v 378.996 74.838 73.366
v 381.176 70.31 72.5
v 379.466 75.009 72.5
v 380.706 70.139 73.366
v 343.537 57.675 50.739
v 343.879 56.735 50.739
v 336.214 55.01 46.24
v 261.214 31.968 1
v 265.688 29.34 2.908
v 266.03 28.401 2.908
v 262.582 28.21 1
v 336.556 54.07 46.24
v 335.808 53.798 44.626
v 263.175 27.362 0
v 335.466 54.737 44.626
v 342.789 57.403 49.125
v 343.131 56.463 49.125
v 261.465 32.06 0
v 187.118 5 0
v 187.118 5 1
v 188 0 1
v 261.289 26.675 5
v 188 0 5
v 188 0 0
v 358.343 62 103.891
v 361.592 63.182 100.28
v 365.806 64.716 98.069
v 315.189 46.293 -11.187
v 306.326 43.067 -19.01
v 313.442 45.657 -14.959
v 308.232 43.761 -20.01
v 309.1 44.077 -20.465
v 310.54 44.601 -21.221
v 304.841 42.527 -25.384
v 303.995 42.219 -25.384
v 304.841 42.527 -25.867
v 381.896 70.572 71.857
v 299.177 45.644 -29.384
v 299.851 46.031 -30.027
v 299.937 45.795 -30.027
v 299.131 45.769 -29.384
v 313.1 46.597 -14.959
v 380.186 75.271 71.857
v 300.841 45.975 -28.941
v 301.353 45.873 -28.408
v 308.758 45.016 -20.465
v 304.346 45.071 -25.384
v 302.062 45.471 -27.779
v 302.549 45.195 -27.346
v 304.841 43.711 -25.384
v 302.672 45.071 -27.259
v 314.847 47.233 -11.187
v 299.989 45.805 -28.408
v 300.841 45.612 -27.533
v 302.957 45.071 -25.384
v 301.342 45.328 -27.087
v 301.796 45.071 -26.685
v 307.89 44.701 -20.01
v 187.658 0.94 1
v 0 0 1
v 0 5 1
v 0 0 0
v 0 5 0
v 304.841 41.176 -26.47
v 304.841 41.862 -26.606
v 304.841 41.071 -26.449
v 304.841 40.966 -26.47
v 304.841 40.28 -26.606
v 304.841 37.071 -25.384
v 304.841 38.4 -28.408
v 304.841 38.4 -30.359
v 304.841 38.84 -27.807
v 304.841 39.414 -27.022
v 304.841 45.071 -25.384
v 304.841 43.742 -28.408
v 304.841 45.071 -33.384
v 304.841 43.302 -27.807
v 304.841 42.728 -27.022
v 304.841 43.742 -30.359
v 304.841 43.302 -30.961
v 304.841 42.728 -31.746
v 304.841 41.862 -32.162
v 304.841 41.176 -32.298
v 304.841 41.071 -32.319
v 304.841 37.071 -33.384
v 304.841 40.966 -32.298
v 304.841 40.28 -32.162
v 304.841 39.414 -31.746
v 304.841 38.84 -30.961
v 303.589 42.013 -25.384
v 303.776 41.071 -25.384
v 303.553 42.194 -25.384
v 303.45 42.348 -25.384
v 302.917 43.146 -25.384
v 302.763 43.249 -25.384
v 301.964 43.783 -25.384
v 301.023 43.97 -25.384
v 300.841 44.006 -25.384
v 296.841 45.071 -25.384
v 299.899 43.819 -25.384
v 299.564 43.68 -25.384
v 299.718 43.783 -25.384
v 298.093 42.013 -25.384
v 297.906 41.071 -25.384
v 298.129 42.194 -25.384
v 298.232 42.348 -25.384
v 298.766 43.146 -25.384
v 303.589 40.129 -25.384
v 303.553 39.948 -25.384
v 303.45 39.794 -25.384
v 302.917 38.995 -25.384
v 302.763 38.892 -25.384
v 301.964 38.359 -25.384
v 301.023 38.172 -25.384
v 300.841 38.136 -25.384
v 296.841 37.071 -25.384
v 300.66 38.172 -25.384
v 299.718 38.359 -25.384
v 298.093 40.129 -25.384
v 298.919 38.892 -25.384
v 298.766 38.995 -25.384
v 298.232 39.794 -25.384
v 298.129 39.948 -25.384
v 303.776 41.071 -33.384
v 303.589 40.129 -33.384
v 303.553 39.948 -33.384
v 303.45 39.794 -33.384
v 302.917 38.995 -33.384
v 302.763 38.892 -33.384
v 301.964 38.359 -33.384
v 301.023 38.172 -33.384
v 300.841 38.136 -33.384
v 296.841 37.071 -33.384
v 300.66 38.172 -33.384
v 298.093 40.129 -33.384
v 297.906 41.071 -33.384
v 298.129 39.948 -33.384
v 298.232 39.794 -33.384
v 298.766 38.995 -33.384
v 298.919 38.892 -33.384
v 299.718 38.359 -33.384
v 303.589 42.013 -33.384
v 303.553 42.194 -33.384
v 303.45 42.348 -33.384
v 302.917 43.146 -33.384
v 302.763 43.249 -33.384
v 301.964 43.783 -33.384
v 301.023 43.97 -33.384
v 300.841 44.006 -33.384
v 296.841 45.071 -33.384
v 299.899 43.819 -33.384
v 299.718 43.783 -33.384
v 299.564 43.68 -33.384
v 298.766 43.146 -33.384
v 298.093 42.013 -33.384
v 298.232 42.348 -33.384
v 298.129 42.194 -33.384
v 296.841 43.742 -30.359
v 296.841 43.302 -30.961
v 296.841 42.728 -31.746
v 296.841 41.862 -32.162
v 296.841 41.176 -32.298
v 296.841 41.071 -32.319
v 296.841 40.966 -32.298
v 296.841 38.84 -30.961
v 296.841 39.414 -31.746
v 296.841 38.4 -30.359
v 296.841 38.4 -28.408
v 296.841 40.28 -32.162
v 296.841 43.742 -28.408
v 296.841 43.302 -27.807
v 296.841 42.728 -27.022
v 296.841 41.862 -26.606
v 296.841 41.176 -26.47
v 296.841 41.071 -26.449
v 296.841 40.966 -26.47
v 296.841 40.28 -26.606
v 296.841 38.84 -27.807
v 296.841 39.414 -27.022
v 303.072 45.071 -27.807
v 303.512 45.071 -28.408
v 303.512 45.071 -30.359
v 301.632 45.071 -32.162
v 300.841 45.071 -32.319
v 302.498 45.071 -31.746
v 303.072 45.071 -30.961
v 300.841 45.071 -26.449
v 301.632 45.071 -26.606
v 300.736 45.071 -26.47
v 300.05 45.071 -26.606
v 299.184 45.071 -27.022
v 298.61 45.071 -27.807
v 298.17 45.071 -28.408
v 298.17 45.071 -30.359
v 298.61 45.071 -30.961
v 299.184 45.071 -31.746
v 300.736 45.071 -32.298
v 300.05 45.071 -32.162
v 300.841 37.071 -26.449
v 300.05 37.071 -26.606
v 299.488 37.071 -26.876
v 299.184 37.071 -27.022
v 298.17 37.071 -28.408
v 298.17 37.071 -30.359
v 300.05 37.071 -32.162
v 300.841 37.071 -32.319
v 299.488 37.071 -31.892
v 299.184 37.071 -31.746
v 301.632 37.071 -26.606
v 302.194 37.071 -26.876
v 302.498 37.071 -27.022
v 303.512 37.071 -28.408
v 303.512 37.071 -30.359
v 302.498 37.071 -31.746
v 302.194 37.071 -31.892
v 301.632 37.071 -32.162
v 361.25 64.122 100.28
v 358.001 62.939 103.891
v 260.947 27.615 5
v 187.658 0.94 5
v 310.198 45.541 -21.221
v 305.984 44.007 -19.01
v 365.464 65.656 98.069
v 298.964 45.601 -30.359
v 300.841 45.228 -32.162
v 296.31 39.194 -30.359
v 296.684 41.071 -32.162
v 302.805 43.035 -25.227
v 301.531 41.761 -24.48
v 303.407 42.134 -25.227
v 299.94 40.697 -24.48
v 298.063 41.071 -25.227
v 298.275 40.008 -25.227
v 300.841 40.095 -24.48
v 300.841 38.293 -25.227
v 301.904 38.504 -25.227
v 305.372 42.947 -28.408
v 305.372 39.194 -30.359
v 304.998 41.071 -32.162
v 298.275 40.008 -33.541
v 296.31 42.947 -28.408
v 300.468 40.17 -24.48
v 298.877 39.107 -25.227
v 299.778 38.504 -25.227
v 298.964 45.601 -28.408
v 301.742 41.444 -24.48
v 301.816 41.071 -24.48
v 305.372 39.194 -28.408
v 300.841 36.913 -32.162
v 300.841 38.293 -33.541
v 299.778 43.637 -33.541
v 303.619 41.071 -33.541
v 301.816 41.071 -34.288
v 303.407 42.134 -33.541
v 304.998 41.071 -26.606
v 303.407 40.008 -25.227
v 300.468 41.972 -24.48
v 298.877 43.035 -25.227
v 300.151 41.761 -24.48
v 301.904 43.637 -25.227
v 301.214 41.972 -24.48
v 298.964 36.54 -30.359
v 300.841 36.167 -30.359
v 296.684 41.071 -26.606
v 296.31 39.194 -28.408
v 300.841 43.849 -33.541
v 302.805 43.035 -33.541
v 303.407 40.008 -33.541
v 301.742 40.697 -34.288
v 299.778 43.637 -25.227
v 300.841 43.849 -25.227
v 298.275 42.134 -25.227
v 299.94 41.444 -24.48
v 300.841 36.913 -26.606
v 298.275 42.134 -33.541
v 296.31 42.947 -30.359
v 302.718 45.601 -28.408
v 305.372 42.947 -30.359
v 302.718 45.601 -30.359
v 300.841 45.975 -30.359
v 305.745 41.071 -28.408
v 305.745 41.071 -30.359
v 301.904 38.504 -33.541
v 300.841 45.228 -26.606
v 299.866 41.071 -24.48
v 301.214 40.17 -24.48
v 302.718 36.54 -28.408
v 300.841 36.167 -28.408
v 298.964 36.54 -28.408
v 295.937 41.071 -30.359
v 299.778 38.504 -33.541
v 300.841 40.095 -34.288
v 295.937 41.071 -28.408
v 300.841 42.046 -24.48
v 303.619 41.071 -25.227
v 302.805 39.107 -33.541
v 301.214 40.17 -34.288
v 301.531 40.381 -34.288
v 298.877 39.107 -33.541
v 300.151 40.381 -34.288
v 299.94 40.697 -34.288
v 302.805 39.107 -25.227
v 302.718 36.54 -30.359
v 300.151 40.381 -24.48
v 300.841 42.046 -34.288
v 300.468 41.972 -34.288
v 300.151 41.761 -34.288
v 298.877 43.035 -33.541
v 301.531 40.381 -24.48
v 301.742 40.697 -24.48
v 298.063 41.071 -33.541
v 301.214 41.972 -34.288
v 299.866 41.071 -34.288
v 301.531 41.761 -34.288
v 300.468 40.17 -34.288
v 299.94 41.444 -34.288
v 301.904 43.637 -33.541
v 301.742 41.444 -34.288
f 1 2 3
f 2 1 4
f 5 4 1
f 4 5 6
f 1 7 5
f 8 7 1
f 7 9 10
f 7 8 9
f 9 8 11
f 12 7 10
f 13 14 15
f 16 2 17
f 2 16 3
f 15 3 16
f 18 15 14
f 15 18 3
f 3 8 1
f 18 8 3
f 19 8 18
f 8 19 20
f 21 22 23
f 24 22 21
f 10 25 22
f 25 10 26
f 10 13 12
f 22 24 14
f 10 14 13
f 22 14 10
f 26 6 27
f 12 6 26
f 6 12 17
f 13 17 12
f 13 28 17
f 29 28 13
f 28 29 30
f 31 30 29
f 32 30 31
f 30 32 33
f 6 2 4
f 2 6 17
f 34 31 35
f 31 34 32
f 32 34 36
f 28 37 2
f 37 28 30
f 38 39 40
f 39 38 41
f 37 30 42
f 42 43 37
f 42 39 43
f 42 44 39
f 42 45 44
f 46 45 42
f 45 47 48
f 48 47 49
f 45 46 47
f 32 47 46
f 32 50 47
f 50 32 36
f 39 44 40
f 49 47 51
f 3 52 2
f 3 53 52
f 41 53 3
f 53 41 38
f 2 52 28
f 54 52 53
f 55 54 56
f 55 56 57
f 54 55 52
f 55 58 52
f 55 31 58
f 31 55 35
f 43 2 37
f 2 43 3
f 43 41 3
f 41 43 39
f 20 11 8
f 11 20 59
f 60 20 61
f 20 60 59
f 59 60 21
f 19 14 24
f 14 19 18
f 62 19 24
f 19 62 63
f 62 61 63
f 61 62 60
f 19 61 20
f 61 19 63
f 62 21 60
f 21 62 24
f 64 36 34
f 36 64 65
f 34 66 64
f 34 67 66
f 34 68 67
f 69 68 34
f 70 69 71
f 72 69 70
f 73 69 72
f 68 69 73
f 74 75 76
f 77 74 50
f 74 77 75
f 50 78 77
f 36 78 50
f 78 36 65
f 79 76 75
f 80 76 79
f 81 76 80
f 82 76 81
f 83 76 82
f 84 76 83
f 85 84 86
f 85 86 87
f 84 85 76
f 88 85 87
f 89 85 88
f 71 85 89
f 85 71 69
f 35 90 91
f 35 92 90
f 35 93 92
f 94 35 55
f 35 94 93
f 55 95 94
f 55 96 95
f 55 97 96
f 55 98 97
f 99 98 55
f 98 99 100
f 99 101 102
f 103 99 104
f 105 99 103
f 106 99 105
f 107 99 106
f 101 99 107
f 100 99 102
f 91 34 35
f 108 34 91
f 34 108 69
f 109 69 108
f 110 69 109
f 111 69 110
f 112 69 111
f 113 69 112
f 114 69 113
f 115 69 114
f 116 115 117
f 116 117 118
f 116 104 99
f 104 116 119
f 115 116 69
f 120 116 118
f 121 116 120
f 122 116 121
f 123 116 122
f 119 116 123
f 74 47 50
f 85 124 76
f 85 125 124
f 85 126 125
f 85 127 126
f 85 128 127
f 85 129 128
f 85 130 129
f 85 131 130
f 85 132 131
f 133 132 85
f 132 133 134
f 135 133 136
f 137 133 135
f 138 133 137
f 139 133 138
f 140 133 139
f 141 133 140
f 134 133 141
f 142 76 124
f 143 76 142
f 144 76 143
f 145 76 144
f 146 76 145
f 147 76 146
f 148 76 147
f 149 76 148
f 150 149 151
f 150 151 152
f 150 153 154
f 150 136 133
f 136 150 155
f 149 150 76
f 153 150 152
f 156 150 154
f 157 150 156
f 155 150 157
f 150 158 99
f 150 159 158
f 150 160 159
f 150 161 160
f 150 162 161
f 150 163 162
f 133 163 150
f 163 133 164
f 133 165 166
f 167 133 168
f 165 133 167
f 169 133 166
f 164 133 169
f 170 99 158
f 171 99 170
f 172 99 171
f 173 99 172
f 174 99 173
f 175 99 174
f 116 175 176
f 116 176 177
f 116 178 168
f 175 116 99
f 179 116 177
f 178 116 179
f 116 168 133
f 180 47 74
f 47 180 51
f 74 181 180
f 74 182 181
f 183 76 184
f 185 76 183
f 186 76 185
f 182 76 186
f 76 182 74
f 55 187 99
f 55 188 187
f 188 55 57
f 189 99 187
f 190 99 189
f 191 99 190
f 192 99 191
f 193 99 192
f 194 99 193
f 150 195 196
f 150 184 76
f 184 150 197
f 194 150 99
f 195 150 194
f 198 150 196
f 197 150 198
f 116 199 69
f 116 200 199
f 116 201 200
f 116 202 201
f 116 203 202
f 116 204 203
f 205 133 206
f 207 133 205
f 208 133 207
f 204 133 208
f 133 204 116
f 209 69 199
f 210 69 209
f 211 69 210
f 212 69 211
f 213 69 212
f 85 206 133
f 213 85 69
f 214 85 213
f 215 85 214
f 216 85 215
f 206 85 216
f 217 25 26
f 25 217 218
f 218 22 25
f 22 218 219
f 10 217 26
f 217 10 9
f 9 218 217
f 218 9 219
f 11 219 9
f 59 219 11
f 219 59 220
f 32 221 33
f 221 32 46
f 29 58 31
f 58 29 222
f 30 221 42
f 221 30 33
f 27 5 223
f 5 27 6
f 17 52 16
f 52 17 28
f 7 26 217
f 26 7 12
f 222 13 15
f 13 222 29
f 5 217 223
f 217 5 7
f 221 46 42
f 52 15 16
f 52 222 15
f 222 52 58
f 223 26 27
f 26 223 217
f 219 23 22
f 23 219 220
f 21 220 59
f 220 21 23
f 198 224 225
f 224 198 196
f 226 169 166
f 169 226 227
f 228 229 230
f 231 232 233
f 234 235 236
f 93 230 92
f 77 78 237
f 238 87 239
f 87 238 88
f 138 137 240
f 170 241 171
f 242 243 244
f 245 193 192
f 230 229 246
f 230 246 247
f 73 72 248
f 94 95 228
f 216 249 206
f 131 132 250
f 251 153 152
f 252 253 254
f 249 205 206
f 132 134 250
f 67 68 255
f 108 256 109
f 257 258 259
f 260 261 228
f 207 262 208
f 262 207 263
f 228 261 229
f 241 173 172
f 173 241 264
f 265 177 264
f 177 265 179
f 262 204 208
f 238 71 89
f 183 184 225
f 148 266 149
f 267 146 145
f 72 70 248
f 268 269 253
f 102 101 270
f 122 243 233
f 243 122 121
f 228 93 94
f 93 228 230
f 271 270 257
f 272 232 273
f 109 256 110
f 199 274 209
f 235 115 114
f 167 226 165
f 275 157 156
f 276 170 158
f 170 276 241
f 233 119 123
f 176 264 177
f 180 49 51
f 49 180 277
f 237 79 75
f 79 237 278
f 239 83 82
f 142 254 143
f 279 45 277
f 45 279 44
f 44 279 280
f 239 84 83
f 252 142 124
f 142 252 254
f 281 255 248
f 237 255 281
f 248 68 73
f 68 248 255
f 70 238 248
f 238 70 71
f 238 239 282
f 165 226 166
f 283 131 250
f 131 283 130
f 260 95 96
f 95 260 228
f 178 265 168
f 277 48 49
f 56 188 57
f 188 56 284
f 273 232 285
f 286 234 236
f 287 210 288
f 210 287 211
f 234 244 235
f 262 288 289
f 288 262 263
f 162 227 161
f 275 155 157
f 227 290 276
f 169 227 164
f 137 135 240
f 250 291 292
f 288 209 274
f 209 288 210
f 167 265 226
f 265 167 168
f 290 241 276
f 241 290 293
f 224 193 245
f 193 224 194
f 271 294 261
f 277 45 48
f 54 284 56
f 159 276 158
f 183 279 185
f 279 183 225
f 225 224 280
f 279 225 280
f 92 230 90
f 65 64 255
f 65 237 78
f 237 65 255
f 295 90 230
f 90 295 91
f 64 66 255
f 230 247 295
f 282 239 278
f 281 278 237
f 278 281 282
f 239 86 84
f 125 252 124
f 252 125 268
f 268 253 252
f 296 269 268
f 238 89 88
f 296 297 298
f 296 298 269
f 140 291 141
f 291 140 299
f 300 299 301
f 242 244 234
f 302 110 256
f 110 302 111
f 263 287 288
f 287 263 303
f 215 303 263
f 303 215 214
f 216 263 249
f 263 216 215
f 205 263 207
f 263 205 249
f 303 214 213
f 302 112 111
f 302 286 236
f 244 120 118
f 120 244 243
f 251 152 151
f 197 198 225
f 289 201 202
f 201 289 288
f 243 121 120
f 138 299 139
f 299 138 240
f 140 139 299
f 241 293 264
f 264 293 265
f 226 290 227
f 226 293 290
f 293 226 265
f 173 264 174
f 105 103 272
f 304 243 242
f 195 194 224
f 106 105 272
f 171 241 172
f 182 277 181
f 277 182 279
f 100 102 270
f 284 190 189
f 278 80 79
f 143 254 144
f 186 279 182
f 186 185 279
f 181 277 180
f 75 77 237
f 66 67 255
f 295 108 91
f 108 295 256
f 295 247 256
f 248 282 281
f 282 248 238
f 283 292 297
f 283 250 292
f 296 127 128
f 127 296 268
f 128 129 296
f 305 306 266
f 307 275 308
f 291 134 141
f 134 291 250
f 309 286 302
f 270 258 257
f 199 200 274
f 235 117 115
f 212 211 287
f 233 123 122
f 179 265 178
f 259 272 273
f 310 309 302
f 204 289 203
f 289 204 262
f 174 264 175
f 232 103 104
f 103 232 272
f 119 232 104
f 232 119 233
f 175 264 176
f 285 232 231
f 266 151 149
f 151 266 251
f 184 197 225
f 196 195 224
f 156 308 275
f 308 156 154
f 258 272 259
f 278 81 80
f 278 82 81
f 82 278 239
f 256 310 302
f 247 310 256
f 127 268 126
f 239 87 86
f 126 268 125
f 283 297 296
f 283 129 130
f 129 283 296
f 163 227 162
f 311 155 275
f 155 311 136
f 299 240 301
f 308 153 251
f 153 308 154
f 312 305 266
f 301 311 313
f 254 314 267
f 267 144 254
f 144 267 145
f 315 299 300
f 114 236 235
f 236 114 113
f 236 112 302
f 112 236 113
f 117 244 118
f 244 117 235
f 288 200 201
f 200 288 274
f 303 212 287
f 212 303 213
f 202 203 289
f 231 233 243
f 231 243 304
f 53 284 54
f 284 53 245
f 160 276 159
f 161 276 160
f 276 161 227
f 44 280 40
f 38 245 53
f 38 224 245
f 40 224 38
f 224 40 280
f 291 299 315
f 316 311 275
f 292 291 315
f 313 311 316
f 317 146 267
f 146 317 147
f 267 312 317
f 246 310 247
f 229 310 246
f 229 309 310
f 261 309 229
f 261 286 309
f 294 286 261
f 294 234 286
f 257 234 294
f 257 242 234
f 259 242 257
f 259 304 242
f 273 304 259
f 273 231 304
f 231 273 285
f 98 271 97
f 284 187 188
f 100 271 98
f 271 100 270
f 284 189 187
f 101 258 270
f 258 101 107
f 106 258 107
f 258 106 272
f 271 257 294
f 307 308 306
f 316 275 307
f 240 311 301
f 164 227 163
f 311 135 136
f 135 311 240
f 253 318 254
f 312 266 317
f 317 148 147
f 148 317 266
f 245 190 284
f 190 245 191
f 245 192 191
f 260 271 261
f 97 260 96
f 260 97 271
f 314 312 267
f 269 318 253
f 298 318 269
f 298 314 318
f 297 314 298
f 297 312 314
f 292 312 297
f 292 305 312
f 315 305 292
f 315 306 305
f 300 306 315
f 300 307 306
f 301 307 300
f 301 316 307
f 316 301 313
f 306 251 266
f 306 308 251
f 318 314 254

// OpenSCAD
// include <servobot3.scad>;

BODY_PIVOT_R = 188;
HIP_L = 80;
LEG_L = 145;
FOOT_L = 133;

ankle_bias = 90; // 90 - 24; // from perpendicular


// r=240.00;
// x=-327.99;
// y=-259.55;
// z=-84.91;
// hip=-37.54;
// knee=-72.23;
// ankle=68.24;

r=0.00;
// x=517.65;
// y=88.88;
// z=-69.54;
hip=20;
knee=-30;
ankle=70;

function angles_to_x(r, h, k, a) = 
    BODY_PIVOT_R * cos(r) +
    HIP_L * cos(h) +
    LEG_L * cos(k) * cos(h) +
    FOOT_L * cos(k + a + ankle_bias) * cos(h);

function angles_to_y(r, h, k, a) = 
    BODY_PIVOT_R * sin(r) +
    HIP_L * sin(h) +
    LEG_L * cos(k) * sin(h) +
    FOOT_L * cos(k + a + ankle_bias) * sin(h);

function angles_to_z(r, h, k, a) = 
    -LEG_L * sin(k) +
    -FOOT_L * sin(k + a + ankle_bias);

function angles_to_p(r, h, k, a) = [
    angles_to_x(r, h, k, a),
    angles_to_y(r, h, k, a),
    angles_to_z(r, h, k, a)];

module angles_to_xyz(r=r, hip=hip, knee=knee, ankle=ankle) {
    rotate([0, 0, r]) {
        cube([BODY_PIVOT_R, 5, 1]);
        translate([BODY_PIVOT_R, 0, 0]) {
            rotate([0, 0, hip]) {
                cube([HIP_L, 5, 1]);
                translate([HIP_L, 0, 0]) {
                    rotate([0, knee, 0]) {
                        cube([LEG_L, 5, 1]);
                        translate([LEG_L, 0, 0]) {
                            rotate([0, ankle + ankle_bias, 0]) {
                                cube([FOOT_L, 5, 1]);
                            }
                        }
                    }
                }
            }
        }
    }
    echo(
        "angles_to_xyz: ",
        r=r, hip=hip, knee=knee, ankle=ankle,
        x=angles_to_x(r, hip, knee, ankle),
        y=angles_to_y(r, hip, knee, ankle),
        z=angles_to_z(r, hip, knee, ankle));
    # translate(angles_to_p(r, hip, knee, ankle)) 
        cube(8, center=true);
}

angles_to_xyz(r, hip, knee, ankle);


module xyz_to_angles(r, x, y, z) {
    translate([x, y, z]) {
        sphere(r=5);
    }

	dx = x - BODY_PIVOT_R * cos(r);
    dy = y - BODY_PIVOT_R * sin(r);
    dz = z;

    hip_angle = atan2(dy, dx) - r;

    // echo(rotation=rotation, x=x, y=y, z=z, 
    // 	dx=dx, dy=dy, dz=dz, hip_angle=hip_angle, dx2=dx2, dy2=dy2);
    
    dx2 = dx - HIP_L * cos(r + hip_angle);
    dy2 = dy - HIP_L * sin(r + hip_angle);

    // echo(rotation=rotation, x=x, y=y, z=z, 
    // 	dx=dx, dy=dy, dz=dz, hip_angle=hip_angle, dx2=dx2, dy2=dy2);
    leg_foot_ext = sqrt(dx2 * dx2 + dy2 * dy2 + dz * dz);
    // # leg_foot_ext is linear distance from hip pivot to foot tip (long side of iso triangle with ankle_angle as center)
    // # law of cosines to the rescue
    if (leg_foot_ext > LEG_L + FOOT_L)
        echo("cannot reach", leg_foot_ext);
    // # ankle = 180 - math.acos((LEG_L * LEG_L + FOOT_L * FOOT_L - leg_foot_ext * leg_foot_ext) / (2 * LEG_L * FOOT_L)) * RAD2DEG
    ankle_prime = acos(
    	(LEG_L * LEG_L + 
    		FOOT_L * FOOT_L - 
    		leg_foot_ext * leg_foot_ext) / (
    		2.0 * LEG_L * FOOT_L));
    
    // print(f"{locals()}")
    hip_foot_angle = -asin(dz / leg_foot_ext);

    /*
	180 = 2 * (hip_foot_angle - knee_angle) + ankle
	(180 - ankle) / 2 = hip_foot_angle - knee_angle
	knee_angle = hip_foot_angle - (180 - ankle)/2
    */
    knee_angle = min(
        max(
            hip_foot_angle - 90 + ankle_prime/2,
            -90), 90);
    // knee_angle = (ankle/2 - hip_foot_angle);

    // ankle_angle = min(90, max(-90, ankle + ankle_bias));
    ankle_angle = 180 - ankle_prime - ankle_bias;

    echo("xyz_to_a:", r=r, 
    	leg_foot_ext=leg_foot_ext,
        hip_angle=hip_angle, 
        knee_angle=knee_angle, 
        ankle_angle=ankle_angle,
    	x=x, y=y, z=z, 
    	dx=dx, dy=dy, dz=dz, dx2=dx2, dy2=dy2, 
    	ankle_prime=ankle_prime, hip_foot_angle=hip_foot_angle);

    translate([
            BODY_PIVOT_R * cos(r), 
            BODY_PIVOT_R * sin(r), 0]) {
    	rotate([0, 0, r + hip_angle]) {
    		cube([HIP_L, 1, 5]);
    		translate([HIP_L, 0, 0]) {
                rotate([0, hip_foot_angle, 0])
                    % cube([leg_foot_ext, 1, 5]);

    			rotate([0, knee_angle, 0]) {
    				cube([LEG_L, 1, 5]);
    				translate([LEG_L, 0, 0]) {
    					rotate([0, ankle_angle + ankle_bias, 0]) {
    						cube([FOOT_L, 1, 5]);
    					}

                        rotate([0, 180 - ankle_prime, 0]) {
                            % cube([FOOT_L, 1, 1]);
                        }
    				}

    			}
    		}
    	}
    }
}

xyz_to_angles(
        r=r,
        x=angles_to_x(r, hip, knee, ankle),
        y=angles_to_y(r, hip, knee, ankle),
        z=angles_to_z(r, hip, knee, ankle));
